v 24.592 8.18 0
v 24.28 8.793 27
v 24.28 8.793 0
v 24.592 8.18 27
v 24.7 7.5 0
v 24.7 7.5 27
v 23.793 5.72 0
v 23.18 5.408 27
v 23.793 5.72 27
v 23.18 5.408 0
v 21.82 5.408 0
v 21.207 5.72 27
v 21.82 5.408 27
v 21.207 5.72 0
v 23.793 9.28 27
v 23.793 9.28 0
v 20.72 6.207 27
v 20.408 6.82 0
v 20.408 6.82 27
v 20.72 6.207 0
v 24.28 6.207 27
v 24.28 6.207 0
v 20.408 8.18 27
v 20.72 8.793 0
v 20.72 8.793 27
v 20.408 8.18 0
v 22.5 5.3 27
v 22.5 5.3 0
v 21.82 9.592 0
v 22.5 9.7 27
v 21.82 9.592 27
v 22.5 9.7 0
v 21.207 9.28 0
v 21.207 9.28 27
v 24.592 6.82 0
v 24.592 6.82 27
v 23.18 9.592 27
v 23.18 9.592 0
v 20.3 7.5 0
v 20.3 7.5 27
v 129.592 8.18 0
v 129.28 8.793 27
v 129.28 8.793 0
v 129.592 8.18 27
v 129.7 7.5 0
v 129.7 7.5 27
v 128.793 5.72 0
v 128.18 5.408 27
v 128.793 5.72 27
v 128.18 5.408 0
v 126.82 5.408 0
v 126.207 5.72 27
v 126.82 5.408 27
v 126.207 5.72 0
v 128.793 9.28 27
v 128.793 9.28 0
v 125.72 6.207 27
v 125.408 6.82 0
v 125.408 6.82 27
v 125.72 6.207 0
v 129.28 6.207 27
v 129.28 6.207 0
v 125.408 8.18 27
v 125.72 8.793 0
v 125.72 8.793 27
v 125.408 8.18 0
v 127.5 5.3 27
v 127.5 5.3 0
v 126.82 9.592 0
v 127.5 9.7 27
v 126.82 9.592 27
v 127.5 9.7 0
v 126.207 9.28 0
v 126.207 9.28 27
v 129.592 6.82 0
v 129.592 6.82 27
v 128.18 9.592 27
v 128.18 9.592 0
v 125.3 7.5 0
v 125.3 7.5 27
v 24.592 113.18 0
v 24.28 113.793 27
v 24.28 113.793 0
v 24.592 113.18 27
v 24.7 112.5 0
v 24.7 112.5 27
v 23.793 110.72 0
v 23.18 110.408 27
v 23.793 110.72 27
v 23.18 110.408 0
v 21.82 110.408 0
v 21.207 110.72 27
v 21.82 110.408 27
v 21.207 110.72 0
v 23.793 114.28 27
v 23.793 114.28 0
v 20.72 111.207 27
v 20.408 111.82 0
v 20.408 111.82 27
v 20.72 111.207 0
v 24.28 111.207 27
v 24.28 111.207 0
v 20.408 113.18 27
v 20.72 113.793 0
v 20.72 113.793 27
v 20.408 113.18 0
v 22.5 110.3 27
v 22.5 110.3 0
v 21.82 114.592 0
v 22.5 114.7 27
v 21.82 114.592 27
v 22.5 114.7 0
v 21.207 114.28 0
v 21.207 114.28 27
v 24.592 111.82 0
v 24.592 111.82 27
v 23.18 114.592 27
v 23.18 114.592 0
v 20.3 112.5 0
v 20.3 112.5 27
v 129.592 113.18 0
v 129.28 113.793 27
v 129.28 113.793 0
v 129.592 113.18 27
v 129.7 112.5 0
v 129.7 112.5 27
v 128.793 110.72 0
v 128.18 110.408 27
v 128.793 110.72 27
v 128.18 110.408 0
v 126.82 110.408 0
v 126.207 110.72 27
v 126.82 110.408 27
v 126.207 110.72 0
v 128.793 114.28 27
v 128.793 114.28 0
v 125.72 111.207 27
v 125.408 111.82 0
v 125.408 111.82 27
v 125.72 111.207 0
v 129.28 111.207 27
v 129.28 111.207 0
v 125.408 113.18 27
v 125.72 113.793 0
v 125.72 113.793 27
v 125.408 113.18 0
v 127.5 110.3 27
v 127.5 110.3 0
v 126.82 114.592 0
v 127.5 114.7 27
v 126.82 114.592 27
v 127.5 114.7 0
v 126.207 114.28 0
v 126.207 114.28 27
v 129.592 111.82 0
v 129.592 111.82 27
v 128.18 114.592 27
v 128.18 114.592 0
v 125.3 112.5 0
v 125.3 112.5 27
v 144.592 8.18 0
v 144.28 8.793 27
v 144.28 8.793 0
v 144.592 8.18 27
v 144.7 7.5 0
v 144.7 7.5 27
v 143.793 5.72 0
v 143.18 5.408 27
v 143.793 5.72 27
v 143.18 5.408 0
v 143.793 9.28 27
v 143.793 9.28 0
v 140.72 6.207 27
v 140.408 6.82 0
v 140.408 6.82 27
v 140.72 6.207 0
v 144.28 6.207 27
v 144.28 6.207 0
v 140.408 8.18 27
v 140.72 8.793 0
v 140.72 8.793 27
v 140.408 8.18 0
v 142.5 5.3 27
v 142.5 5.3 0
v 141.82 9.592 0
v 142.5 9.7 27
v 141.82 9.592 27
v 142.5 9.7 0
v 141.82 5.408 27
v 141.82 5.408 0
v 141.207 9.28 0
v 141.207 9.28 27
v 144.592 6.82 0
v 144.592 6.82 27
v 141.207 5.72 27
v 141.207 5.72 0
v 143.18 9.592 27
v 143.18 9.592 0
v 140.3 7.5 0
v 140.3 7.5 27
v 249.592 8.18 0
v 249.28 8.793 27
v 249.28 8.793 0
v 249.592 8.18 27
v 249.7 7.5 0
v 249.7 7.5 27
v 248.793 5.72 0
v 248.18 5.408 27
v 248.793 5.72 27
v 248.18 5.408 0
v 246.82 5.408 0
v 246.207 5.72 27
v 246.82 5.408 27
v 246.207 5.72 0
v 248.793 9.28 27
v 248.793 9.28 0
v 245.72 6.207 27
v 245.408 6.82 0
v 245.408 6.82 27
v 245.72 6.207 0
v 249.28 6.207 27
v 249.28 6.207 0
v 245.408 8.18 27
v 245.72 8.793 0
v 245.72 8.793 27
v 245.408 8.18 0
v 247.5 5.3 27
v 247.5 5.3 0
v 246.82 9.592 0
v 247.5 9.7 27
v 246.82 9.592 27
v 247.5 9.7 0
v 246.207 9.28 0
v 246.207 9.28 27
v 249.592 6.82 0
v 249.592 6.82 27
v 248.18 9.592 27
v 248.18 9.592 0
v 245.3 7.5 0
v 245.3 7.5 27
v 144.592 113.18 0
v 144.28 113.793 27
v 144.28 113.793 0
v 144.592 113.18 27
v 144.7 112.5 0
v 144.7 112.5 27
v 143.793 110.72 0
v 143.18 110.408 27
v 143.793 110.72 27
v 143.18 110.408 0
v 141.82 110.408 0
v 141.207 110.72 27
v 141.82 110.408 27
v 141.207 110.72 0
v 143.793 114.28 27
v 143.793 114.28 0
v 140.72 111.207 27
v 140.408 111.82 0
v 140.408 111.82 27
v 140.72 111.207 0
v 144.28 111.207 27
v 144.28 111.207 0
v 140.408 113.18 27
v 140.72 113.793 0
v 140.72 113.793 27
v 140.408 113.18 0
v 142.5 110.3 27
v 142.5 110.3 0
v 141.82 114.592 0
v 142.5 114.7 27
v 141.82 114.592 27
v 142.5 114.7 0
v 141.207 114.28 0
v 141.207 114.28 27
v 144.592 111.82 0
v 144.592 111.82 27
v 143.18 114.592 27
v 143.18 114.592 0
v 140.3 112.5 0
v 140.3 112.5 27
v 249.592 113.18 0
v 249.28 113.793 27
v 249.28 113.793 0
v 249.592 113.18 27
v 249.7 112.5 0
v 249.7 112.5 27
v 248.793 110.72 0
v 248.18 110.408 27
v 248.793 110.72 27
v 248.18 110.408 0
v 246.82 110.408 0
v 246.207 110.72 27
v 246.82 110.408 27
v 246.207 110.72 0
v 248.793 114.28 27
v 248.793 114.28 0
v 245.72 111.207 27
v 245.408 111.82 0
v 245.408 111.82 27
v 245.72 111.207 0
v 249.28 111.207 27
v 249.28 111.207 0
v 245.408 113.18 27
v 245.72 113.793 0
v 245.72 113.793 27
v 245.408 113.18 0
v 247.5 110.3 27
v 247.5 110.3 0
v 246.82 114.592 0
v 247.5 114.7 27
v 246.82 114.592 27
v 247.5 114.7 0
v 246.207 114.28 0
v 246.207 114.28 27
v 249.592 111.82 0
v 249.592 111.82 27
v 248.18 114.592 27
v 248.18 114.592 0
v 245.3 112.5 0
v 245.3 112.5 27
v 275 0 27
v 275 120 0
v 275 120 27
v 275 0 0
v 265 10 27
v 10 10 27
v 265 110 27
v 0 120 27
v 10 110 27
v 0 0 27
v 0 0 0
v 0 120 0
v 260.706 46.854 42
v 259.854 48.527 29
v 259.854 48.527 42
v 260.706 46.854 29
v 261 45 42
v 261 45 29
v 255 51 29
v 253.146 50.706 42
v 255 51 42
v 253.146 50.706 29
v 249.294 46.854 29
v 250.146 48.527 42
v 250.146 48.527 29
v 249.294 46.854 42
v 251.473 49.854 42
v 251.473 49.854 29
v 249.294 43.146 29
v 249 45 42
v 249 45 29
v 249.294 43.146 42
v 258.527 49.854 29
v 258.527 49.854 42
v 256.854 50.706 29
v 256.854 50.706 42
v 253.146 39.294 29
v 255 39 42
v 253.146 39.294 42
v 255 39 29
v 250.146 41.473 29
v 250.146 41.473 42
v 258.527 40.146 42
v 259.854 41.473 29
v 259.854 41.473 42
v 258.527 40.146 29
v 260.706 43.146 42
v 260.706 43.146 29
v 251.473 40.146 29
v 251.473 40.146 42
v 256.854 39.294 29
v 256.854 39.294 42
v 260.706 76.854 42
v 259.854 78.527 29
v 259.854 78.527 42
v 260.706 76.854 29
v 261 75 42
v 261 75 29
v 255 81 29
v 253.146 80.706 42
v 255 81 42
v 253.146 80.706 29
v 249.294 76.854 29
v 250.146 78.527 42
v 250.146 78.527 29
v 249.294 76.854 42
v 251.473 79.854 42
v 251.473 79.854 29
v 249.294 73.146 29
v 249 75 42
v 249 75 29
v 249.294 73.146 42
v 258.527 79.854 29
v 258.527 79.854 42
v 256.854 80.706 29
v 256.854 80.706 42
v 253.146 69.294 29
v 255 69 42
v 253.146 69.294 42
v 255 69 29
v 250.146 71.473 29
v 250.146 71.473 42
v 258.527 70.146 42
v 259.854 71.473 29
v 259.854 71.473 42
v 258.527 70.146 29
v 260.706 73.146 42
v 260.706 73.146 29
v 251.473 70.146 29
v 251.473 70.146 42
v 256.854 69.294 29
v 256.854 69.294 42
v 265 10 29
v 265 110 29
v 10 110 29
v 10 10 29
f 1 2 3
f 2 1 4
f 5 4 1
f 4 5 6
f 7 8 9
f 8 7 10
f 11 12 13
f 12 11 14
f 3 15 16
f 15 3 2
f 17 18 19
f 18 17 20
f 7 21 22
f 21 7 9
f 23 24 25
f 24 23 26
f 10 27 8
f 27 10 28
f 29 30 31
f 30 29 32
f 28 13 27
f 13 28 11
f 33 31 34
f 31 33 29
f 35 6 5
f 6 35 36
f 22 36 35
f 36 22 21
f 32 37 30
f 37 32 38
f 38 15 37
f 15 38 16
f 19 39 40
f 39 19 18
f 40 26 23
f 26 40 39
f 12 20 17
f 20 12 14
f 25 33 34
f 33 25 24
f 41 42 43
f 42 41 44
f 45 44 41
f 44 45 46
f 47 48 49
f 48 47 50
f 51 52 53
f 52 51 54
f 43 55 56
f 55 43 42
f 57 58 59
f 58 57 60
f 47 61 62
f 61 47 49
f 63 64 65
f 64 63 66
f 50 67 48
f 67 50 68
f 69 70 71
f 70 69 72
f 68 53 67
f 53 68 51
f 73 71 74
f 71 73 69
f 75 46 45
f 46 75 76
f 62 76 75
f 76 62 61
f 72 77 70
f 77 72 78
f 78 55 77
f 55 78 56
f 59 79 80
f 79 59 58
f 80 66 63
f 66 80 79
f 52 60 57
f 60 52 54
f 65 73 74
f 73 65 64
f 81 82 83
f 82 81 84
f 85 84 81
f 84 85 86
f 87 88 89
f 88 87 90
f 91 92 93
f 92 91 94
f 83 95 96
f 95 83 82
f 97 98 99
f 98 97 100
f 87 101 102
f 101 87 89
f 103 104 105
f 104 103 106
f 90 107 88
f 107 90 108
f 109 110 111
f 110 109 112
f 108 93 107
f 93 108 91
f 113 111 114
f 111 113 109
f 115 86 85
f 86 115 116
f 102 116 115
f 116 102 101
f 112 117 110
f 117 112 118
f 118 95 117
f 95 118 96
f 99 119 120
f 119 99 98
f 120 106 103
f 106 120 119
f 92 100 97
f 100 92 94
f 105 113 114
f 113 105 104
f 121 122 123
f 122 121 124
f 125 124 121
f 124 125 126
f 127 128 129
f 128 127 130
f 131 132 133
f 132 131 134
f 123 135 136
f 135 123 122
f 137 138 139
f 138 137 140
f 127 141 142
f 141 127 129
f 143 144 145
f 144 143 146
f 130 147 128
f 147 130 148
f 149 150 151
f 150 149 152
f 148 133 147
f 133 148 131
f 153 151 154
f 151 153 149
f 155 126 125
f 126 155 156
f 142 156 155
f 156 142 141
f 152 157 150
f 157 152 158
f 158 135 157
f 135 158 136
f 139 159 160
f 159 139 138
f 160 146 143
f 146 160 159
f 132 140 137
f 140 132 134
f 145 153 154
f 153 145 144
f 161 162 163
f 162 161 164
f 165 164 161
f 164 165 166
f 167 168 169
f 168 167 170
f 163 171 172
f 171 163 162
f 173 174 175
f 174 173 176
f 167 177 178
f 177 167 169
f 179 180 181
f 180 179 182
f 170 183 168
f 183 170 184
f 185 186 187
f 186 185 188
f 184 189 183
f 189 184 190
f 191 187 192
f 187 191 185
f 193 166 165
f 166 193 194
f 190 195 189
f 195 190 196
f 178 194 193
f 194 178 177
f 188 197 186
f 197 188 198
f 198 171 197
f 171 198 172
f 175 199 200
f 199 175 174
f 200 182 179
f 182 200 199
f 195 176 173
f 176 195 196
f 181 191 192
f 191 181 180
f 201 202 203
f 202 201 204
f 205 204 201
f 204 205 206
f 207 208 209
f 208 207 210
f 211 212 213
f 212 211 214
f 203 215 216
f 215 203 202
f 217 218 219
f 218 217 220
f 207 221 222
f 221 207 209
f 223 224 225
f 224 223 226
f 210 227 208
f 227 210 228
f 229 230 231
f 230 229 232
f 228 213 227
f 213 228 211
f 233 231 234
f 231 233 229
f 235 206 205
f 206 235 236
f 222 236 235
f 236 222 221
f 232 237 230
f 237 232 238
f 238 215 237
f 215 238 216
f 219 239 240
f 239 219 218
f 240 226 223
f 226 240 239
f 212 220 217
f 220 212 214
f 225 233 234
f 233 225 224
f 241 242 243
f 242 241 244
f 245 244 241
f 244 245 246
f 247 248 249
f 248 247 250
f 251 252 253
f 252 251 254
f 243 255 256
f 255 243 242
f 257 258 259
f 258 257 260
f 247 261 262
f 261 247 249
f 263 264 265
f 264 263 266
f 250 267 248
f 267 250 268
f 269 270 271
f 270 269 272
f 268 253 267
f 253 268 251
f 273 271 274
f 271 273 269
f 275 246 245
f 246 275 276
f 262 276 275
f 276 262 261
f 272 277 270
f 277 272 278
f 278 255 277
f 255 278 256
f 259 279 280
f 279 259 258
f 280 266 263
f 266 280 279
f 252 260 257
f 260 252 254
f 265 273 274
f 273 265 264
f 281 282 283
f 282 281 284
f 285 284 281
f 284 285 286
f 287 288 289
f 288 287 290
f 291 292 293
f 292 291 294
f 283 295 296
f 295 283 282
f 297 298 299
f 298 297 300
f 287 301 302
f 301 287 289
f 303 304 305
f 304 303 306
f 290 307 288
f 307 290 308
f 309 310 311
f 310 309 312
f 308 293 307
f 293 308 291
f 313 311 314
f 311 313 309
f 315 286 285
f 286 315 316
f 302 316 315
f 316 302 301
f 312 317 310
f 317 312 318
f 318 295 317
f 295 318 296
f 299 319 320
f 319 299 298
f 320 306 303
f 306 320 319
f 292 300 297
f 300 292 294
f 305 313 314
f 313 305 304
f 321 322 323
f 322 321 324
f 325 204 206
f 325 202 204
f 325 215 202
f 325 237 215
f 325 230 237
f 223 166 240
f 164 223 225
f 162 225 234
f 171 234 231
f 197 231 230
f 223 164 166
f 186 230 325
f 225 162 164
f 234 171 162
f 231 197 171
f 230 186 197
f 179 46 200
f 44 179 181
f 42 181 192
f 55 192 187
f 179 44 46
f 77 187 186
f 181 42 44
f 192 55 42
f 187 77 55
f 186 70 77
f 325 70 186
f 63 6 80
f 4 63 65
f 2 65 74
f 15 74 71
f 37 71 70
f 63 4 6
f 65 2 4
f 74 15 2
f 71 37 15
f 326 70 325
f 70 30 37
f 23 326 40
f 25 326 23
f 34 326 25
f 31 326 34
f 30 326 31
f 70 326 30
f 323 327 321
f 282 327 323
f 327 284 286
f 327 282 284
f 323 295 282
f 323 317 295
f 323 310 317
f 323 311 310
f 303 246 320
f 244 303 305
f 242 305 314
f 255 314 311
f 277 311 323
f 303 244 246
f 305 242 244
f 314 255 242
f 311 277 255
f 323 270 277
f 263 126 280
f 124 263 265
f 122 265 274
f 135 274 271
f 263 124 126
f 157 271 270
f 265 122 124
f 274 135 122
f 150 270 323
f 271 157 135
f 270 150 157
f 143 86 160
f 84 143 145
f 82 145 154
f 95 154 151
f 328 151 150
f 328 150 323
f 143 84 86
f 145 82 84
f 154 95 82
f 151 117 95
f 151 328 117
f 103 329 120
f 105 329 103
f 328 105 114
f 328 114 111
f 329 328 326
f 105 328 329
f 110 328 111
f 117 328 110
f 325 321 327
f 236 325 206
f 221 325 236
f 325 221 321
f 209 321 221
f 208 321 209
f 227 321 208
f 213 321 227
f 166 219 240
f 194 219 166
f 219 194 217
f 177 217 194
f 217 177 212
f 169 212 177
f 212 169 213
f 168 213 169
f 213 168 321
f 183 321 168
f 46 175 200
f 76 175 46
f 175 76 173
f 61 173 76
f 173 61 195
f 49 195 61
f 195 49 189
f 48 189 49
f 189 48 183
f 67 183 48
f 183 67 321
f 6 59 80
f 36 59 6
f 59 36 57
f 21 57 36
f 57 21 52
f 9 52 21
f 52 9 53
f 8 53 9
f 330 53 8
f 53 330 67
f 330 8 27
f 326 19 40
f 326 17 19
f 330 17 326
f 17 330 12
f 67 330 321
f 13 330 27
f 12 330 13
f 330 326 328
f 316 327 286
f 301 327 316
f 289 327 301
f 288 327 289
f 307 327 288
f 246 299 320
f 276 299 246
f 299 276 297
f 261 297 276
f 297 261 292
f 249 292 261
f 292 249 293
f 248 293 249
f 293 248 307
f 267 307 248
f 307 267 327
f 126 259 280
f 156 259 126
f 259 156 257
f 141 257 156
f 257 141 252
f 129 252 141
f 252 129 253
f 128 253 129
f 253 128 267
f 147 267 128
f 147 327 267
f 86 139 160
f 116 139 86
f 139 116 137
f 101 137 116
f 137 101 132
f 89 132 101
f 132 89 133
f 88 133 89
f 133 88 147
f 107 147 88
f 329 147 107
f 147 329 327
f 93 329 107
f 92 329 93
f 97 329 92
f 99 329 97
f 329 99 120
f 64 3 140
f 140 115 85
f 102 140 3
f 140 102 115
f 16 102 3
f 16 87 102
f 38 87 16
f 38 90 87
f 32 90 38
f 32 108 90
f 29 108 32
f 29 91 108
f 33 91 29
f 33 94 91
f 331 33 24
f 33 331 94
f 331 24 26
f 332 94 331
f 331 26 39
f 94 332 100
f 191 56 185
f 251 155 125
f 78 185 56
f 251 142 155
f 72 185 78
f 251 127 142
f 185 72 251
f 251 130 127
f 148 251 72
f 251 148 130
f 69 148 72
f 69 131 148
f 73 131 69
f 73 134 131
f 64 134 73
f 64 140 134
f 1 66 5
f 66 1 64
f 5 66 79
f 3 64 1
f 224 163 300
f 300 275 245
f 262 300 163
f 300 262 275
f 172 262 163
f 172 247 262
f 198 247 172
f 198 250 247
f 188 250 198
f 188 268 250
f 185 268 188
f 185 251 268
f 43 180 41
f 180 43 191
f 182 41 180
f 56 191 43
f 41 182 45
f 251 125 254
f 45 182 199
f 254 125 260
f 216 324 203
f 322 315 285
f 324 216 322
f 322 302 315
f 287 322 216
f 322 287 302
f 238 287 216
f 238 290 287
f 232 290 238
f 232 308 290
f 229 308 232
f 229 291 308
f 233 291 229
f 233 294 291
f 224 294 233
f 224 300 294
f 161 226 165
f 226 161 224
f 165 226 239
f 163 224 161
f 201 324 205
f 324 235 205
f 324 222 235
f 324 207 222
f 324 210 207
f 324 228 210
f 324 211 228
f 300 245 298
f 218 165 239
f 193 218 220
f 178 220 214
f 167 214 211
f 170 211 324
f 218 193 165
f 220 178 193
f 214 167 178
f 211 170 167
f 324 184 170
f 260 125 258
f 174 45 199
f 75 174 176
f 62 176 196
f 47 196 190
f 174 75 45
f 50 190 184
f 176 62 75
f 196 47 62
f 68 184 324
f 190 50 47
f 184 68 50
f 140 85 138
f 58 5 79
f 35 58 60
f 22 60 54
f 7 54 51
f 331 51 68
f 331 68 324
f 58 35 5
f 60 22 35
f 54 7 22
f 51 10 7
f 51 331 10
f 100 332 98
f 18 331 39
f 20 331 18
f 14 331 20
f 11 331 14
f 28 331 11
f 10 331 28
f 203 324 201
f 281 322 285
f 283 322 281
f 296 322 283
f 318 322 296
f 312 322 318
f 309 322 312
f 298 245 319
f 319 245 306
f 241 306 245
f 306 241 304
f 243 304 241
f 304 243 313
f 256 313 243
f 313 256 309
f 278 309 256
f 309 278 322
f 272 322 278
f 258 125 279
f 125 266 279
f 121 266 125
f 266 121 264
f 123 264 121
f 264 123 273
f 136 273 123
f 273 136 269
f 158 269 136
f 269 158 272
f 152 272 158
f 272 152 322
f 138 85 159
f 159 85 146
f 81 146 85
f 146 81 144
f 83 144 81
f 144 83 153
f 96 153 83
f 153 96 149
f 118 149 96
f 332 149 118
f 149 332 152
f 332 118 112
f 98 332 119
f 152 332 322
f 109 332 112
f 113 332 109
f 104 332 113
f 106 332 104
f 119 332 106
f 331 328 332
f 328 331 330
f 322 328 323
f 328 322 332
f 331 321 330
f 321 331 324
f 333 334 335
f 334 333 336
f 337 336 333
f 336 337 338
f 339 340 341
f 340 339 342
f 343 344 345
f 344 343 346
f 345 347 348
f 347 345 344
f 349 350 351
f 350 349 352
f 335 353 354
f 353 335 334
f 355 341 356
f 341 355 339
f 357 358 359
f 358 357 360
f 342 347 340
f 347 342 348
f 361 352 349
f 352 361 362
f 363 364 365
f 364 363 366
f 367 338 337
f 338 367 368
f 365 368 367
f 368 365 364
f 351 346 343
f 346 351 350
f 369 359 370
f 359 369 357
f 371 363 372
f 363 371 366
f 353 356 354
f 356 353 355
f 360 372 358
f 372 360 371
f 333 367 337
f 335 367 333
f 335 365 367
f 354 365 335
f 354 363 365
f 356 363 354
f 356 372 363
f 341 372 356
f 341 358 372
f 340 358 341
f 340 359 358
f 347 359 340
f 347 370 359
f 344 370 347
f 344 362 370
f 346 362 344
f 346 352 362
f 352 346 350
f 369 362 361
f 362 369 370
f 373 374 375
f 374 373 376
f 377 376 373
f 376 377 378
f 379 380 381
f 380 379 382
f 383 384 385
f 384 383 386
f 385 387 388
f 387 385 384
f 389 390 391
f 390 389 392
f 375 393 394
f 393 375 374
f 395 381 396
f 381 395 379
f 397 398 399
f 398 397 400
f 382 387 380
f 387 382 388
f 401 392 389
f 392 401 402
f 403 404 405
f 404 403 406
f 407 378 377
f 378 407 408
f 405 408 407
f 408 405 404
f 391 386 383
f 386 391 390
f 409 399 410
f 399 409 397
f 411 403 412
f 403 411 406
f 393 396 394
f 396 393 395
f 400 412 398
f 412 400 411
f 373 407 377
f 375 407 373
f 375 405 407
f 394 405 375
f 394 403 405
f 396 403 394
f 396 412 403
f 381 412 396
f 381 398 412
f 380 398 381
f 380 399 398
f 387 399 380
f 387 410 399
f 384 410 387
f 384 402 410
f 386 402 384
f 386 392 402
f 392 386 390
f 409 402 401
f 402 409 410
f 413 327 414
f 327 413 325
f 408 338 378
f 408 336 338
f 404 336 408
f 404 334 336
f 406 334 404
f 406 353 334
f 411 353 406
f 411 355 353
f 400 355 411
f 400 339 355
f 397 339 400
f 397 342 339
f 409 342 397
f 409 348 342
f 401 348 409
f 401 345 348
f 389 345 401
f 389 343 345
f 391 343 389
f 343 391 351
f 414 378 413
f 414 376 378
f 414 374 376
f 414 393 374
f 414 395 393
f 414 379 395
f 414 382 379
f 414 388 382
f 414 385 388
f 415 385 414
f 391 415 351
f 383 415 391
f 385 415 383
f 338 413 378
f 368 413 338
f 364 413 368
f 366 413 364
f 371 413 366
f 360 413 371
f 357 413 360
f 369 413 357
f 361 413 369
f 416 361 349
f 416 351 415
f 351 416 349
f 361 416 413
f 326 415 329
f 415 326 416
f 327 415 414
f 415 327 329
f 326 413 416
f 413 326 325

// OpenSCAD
// 240mm AIO Radiator Model
// 2x 120mm fan mount radiator for liquid cooling

module aio_radiator_240() {
    // Radiator dimensions
    rad_length = 275;      // Length (slightly longer than 2x 120mm)
    rad_width = 120;       // Width (matches 120mm fan)
    rad_thickness = 27;    // Standard thin radiator

    // Fan mount hole spacing (120mm fans)
    fan_mount_inset = 7.5;
    fan_spacing = 120;     // Center to center
    mount_hole_radius = 2.2;

    // Fitting positions
    fitting_radius = 6;
    fitting_height = 15;

    union() {
        // Main radiator body
        color("black") {
            difference() {
                cube([rad_length, rad_width, rad_thickness]);

                // Fan mount holes (2x 120mm pattern)
                for (fan = [0:1]) {
                    fan_offset = 15 + fan * fan_spacing;
                    mount_positions = [
                        [fan_offset + fan_mount_inset, fan_mount_inset],
                        [fan_offset + fan_spacing - fan_mount_inset, fan_mount_inset],
                        [fan_offset + fan_mount_inset, rad_width - fan_mount_inset],
                        [fan_offset + fan_spacing - fan_mount_inset, rad_width - fan_mount_inset]
                    ];
                    for (pos = mount_positions) {
                        translate([pos[0], pos[1], -0.1]) {
                            cylinder(h = rad_thickness + 0.2, r = mount_hole_radius, $fn = 20);
                        }
                    }
                }
            }
        }

        // Fins indication (visual only)
        color("dimgray") {
            translate([10, 10, rad_thickness]) {
                cube([rad_length - 20, rad_width - 20, 2]);
            }
        }

        // Inlet/outlet fittings
        color("silver") {
            // Inlet
            translate([rad_length - 20, rad_width/2 - 15, rad_thickness]) {
                cylinder(h = fitting_height, r = fitting_radius, $fn = 20);
            }
            // Outlet
            translate([rad_length - 20, rad_width/2 + 15, rad_thickness]) {
                cylinder(h = fitting_height, r = fitting_radius, $fn = 20);
            }
        }
    }
}

// Preview
aio_radiator_240();
